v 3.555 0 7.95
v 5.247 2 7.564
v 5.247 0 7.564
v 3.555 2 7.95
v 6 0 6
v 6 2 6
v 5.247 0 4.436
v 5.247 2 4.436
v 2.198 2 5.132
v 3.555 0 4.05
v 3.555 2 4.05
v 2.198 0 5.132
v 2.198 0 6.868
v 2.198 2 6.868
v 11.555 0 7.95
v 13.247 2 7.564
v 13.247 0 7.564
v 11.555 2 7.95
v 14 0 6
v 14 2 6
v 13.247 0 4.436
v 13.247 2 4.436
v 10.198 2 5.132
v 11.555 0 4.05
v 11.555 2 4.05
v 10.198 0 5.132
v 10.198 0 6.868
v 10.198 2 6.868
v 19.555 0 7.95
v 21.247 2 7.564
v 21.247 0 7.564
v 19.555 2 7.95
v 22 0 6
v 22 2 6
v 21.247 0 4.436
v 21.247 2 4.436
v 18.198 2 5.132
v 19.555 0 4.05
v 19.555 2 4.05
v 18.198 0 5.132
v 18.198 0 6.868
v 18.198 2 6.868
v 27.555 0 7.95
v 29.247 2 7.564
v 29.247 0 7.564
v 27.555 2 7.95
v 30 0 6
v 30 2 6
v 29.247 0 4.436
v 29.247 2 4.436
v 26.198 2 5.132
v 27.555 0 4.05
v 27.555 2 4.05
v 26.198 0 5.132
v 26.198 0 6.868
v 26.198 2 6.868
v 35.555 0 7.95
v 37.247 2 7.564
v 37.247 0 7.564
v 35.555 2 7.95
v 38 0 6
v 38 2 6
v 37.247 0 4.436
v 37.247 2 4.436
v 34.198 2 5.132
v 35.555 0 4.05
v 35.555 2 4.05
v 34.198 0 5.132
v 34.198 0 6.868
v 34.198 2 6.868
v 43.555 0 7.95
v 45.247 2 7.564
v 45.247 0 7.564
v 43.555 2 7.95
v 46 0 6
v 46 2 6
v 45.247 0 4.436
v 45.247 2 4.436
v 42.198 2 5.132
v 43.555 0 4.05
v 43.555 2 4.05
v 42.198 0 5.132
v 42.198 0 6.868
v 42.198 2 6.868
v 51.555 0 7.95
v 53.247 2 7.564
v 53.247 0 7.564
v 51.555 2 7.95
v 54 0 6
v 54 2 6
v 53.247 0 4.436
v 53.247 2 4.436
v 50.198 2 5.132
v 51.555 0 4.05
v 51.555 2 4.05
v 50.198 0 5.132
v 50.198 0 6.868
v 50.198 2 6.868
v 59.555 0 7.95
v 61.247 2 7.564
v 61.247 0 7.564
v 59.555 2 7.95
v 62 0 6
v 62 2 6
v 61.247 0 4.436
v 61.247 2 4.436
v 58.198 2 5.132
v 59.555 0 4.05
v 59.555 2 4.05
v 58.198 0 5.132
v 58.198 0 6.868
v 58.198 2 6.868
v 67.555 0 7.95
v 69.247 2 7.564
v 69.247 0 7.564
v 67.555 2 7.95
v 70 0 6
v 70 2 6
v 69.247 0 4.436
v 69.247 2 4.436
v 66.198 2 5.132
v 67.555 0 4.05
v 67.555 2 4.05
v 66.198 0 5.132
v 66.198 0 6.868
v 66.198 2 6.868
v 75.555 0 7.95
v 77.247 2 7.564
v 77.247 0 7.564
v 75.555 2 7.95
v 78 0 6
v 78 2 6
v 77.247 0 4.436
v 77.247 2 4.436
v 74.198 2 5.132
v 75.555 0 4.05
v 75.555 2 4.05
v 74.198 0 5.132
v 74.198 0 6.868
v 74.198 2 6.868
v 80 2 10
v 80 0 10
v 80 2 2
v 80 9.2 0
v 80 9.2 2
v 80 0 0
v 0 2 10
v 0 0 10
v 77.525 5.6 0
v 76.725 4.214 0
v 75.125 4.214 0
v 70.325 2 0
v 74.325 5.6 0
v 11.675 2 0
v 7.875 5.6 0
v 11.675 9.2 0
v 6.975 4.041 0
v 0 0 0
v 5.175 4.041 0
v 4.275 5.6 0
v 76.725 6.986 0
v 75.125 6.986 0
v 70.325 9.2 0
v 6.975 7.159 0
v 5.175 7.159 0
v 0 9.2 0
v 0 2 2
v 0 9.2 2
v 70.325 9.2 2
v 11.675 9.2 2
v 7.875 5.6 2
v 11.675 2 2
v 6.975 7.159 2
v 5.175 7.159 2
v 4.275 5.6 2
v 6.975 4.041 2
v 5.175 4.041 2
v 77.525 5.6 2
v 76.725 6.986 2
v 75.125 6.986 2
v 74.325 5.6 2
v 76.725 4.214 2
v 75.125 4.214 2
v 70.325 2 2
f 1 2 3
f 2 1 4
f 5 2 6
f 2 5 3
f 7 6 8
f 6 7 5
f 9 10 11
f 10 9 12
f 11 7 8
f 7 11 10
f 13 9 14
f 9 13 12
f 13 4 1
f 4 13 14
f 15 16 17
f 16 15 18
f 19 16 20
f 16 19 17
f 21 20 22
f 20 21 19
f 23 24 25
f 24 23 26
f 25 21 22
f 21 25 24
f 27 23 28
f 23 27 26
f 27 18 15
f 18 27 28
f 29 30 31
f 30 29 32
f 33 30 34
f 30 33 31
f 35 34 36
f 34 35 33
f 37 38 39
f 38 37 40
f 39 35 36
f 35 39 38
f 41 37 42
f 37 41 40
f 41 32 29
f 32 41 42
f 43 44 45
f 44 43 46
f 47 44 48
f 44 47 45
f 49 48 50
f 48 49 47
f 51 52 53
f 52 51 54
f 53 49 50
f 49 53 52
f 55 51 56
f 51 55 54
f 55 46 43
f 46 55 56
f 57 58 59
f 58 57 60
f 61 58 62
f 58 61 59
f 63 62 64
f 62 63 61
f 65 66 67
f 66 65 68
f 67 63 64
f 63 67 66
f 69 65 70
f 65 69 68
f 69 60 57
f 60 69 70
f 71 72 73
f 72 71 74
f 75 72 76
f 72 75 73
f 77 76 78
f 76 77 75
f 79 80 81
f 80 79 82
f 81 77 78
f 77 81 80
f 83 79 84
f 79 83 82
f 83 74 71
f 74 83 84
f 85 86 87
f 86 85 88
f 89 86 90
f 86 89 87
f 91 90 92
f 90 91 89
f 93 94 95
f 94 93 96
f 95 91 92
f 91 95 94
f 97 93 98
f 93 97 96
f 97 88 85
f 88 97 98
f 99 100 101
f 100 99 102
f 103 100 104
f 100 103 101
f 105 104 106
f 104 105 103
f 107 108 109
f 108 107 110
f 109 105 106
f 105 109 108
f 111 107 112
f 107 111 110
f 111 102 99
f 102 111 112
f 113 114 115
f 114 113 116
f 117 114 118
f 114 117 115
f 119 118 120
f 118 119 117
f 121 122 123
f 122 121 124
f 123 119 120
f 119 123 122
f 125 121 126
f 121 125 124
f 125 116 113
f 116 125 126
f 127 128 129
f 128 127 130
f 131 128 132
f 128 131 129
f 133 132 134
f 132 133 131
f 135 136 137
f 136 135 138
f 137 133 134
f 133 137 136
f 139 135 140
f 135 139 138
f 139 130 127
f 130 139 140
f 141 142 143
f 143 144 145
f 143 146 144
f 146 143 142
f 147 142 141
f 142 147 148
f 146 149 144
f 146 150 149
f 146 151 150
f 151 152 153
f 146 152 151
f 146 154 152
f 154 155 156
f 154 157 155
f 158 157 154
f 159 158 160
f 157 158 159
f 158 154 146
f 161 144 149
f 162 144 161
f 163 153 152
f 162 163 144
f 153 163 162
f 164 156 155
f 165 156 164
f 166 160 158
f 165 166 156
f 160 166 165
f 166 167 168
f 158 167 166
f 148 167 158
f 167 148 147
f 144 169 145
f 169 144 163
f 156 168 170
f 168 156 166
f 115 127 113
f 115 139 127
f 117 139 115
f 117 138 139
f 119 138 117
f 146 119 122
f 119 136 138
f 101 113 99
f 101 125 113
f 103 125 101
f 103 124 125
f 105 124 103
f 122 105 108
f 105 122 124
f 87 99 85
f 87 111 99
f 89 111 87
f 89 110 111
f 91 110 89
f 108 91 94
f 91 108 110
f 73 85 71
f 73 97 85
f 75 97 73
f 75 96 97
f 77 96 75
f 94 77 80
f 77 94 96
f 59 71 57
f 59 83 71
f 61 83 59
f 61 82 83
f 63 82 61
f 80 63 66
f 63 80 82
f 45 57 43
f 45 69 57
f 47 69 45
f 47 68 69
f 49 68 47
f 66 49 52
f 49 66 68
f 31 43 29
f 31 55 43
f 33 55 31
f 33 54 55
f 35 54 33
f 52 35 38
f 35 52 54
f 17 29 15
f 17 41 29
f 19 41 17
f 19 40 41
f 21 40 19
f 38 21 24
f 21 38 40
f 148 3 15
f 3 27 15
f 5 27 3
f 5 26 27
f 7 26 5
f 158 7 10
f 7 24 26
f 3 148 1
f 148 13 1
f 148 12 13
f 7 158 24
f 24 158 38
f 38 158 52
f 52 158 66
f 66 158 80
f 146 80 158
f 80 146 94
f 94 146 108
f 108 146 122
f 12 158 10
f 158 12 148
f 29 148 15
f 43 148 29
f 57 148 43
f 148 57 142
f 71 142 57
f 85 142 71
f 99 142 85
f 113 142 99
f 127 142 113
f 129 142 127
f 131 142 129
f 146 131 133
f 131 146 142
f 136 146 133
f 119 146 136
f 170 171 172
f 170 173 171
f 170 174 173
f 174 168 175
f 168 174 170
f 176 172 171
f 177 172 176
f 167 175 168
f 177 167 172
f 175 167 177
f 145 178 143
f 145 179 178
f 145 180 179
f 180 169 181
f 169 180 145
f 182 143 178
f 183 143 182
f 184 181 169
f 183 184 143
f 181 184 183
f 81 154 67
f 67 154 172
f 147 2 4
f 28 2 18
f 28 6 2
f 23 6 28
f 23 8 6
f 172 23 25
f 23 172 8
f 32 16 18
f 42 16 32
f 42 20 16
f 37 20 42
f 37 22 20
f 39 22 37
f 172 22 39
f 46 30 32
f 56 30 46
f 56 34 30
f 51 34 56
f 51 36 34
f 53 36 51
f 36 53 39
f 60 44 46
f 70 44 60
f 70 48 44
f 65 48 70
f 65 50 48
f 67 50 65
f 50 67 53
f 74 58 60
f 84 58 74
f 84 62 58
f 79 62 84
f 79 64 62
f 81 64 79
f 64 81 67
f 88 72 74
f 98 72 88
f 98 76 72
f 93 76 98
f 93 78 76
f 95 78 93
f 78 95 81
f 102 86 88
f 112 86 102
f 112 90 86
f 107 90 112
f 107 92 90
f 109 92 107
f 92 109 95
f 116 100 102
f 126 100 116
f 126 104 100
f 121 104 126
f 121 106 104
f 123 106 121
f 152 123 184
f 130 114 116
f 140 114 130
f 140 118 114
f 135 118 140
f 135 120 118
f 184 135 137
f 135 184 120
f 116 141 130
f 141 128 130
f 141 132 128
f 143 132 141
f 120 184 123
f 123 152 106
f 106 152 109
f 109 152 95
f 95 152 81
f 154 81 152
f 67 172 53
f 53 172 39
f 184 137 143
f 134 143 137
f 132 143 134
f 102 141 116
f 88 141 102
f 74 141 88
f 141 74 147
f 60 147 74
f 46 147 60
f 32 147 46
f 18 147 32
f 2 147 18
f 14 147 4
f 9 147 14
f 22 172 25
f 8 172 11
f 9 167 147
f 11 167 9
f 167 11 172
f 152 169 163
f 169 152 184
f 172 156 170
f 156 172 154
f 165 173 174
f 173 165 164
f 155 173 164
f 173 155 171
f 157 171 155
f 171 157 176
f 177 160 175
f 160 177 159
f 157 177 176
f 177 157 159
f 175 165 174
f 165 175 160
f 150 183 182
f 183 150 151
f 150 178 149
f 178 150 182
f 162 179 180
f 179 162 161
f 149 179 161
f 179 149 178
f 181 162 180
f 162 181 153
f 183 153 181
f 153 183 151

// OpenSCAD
// configuration
space=4;
hole=4;
pad=space / 2;
fixdist=69.85;
fixhole=3.2;

// internal
width=ceil(ceil(fixdist - 2*pad + space) / (hole+space)/2)*2;
assert(width % 2 == 0);
fixhole_center = (width*(hole+space)+pad - fixdist - fixhole)/2;
fixhole_offset = fixhole_center + fixhole + 2*pad;
hollow_width = width*(hole+space) + pad - 2 * fixhole_offset;

difference(){
    
    // full piece
    cube([width*hole + (width-1)*space + 2*pad, 3*pad+fixhole, hole+3*pad]);

    // main cavity
    translate([-1, pad, pad]){
        cube([(hole+space)*width+pad+pad, 28,28]);};

    // low cavity
    translate([fixhole_offset, pad, -pad]){
        cube([hollow_width, 2*(hole+space)+pad, 3*pad]);
    };

    // low plate right hole
    translate([fixhole_center + fixhole / 2, 2*pad + fixhole/2, -pad]){
        cylinder(h=3*pad, r=fixhole/2 + 0.2);
    };

    // low plate left hole
    translate([fixhole_center + fixhole / 2 + fixdist, 2*pad + fixhole/2, -pad]){
        cylinder(h=3*pad, r=fixhole/2);
    };
    
    // vertical plate holes
    translate([0, 0, 2*pad+hole/2]) {   
        rotate([90, 0, 0]) {
                union() {
                    for(i=[0:width-1]) {
                        translate([pad + (hole + space)*i + hole/2, 0, -2*pad]) {
                            cylinder(h=pad*4, r=hole/2);
                        }
                    }
                }
        }
    }
}
